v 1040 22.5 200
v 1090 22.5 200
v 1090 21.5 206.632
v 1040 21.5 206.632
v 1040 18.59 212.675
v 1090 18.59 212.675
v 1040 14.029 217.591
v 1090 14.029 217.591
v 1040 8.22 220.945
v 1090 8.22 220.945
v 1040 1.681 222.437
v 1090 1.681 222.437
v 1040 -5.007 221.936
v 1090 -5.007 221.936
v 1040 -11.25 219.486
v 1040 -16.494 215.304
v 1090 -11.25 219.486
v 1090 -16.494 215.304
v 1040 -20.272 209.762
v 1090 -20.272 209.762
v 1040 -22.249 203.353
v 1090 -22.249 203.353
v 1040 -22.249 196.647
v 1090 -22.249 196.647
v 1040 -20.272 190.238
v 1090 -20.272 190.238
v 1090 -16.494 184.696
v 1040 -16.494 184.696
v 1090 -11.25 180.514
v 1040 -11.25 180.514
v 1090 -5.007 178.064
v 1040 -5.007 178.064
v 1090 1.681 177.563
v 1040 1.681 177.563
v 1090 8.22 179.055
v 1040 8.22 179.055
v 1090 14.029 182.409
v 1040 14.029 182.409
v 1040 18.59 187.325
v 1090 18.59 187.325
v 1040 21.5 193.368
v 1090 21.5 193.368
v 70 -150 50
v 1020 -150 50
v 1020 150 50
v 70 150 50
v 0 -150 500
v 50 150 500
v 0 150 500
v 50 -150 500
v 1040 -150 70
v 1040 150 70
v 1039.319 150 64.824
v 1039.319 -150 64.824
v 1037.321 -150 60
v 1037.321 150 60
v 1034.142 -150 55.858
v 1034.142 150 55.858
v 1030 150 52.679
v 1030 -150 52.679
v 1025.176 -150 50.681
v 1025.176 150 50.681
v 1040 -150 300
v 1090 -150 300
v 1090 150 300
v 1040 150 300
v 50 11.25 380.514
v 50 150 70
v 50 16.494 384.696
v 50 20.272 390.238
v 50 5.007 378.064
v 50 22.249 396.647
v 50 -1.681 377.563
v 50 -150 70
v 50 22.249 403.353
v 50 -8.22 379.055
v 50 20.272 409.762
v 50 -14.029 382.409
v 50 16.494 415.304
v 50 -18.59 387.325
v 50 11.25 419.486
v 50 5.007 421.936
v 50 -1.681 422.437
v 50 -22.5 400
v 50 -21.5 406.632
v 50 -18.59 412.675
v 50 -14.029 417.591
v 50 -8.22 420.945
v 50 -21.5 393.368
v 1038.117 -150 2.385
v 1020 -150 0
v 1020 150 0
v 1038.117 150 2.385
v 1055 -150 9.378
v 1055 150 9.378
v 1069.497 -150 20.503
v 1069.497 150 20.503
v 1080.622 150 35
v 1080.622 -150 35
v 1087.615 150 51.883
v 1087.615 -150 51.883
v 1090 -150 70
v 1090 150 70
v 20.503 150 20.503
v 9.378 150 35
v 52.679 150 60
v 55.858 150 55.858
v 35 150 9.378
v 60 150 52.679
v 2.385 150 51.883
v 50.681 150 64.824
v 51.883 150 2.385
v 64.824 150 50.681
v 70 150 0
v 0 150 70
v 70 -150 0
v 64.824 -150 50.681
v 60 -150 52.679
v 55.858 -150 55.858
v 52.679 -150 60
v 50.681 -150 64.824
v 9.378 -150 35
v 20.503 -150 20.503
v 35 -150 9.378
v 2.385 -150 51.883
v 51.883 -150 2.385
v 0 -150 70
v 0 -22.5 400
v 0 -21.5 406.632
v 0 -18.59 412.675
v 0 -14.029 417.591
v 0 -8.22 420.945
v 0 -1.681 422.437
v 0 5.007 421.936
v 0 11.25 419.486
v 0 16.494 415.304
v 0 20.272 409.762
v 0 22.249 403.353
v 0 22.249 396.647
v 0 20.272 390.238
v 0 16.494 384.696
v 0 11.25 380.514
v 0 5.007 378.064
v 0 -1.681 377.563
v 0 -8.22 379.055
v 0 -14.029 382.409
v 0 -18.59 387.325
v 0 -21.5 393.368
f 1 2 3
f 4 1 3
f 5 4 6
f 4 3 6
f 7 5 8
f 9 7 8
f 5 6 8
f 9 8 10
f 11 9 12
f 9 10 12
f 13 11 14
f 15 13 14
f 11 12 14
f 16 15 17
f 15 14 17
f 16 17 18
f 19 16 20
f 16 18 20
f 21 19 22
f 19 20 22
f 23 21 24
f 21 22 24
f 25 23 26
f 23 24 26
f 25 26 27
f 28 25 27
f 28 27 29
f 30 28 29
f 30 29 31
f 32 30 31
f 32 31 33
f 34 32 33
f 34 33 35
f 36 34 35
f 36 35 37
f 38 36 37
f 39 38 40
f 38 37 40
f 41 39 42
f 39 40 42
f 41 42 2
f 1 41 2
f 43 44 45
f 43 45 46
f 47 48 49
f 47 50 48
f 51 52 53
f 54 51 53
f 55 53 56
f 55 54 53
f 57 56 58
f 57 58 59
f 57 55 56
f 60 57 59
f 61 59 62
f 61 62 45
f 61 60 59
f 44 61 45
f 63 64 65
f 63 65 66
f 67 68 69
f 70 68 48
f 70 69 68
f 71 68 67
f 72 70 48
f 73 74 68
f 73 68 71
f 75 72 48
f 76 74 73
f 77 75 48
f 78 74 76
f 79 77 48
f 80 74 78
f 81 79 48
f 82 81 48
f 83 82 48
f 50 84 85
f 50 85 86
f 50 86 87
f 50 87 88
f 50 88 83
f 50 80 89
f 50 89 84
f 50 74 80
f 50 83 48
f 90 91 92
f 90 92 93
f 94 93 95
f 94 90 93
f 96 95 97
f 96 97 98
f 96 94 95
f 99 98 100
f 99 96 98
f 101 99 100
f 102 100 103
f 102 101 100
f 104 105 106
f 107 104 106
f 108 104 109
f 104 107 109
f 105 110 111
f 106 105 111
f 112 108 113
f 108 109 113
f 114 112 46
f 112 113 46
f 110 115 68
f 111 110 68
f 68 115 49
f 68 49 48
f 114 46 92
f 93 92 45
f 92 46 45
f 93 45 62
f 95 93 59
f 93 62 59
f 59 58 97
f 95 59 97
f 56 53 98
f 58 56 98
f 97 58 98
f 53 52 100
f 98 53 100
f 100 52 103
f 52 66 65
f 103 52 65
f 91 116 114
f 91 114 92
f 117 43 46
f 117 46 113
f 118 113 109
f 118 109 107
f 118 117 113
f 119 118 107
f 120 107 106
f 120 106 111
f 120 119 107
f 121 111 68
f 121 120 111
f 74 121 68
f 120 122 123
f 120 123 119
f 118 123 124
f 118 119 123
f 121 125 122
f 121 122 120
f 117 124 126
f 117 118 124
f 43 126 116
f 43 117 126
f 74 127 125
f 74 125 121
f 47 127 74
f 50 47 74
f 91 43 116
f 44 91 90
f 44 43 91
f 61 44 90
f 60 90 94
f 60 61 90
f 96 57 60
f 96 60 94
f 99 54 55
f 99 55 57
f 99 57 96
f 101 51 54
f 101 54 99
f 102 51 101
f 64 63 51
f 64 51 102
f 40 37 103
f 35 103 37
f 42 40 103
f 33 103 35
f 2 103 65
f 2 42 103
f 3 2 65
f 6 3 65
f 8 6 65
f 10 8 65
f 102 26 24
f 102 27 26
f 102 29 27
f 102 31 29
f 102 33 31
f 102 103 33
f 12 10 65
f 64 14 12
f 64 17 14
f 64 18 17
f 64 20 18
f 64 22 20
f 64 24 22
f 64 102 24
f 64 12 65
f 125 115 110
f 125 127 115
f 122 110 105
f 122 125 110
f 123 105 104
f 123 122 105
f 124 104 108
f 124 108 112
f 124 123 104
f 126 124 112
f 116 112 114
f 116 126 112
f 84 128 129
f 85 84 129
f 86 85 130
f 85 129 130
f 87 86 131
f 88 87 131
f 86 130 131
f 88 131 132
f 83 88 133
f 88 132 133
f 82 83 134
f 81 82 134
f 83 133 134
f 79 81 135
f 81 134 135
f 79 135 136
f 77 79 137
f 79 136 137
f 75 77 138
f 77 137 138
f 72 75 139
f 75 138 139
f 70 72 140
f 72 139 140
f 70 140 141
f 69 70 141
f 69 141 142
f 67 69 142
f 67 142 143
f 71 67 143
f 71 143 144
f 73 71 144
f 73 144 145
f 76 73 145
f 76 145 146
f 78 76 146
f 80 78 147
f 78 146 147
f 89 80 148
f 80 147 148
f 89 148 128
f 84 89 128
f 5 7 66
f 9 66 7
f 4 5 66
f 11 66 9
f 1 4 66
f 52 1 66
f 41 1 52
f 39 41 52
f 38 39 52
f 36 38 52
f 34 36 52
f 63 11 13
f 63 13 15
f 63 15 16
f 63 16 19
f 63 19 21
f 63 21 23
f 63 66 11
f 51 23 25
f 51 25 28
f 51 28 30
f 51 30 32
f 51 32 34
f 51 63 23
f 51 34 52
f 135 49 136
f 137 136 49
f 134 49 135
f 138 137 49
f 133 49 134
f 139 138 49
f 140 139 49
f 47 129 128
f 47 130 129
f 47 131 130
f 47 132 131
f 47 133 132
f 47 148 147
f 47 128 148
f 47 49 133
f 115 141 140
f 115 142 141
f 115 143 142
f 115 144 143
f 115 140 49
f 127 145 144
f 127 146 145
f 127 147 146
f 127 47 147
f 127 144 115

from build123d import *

# Parameters (mm, degrees)
F1_DEPTH = 150
F2_R     = 22.5
F3_DEPTH = 50
F4_R     = 22.5
F5_DEPTH = 50


with BuildPart() as f1:
    # F0 (on Front) → F1 (new body, symmetric)
    with BuildSketch(Plane.XZ):
        with BuildLine():
            ThreePointArc((0, 70), (20.5025253169, 20.5025253169), (70, 0))
            Line((70, 0), (1020, 0))
            ThreePointArc((1020, 0), (1069.4974746831, 20.5025253169), (1090, 70))
            Line((1090, 70), (1090, 300))
            Line((1090, 300), (1040, 300))
            Line((1040, 300), (1040, 70))
            ThreePointArc((1040, 70), (1034.1421356237, 55.8578643763), (1020, 50))
            Line((1020, 50), (70, 50))
            ThreePointArc((70, 50), (55.8578643763, 55.8578643763), (50, 70))
            Line((50, 70), (50, 500))
            Line((50, 500), (0, 500))
            Line((0, 500), (0, 70))
        make_face()
    extrude(amount=F1_DEPTH, both=True)

    # F2 (on face) → F3 (cut, through all)
    with BuildSketch(Plane.YZ.offset(1090)):
        with Locations((0, 200)):
            Circle(F2_R)
    extrude(amount=-F3_DEPTH, mode=Mode.SUBTRACT)

    # F4 (on face) → F5 (cut, through all)
    with BuildSketch(Plane(origin=(0, 0, 0), x_dir=(0, -1, 0), z_dir=(-1, 0, 0))):
        with Locations((0, 400)):
            Circle(F4_R)
    extrude(amount=-F5_DEPTH, mode=Mode.SUBTRACT)


solid = f1.part
